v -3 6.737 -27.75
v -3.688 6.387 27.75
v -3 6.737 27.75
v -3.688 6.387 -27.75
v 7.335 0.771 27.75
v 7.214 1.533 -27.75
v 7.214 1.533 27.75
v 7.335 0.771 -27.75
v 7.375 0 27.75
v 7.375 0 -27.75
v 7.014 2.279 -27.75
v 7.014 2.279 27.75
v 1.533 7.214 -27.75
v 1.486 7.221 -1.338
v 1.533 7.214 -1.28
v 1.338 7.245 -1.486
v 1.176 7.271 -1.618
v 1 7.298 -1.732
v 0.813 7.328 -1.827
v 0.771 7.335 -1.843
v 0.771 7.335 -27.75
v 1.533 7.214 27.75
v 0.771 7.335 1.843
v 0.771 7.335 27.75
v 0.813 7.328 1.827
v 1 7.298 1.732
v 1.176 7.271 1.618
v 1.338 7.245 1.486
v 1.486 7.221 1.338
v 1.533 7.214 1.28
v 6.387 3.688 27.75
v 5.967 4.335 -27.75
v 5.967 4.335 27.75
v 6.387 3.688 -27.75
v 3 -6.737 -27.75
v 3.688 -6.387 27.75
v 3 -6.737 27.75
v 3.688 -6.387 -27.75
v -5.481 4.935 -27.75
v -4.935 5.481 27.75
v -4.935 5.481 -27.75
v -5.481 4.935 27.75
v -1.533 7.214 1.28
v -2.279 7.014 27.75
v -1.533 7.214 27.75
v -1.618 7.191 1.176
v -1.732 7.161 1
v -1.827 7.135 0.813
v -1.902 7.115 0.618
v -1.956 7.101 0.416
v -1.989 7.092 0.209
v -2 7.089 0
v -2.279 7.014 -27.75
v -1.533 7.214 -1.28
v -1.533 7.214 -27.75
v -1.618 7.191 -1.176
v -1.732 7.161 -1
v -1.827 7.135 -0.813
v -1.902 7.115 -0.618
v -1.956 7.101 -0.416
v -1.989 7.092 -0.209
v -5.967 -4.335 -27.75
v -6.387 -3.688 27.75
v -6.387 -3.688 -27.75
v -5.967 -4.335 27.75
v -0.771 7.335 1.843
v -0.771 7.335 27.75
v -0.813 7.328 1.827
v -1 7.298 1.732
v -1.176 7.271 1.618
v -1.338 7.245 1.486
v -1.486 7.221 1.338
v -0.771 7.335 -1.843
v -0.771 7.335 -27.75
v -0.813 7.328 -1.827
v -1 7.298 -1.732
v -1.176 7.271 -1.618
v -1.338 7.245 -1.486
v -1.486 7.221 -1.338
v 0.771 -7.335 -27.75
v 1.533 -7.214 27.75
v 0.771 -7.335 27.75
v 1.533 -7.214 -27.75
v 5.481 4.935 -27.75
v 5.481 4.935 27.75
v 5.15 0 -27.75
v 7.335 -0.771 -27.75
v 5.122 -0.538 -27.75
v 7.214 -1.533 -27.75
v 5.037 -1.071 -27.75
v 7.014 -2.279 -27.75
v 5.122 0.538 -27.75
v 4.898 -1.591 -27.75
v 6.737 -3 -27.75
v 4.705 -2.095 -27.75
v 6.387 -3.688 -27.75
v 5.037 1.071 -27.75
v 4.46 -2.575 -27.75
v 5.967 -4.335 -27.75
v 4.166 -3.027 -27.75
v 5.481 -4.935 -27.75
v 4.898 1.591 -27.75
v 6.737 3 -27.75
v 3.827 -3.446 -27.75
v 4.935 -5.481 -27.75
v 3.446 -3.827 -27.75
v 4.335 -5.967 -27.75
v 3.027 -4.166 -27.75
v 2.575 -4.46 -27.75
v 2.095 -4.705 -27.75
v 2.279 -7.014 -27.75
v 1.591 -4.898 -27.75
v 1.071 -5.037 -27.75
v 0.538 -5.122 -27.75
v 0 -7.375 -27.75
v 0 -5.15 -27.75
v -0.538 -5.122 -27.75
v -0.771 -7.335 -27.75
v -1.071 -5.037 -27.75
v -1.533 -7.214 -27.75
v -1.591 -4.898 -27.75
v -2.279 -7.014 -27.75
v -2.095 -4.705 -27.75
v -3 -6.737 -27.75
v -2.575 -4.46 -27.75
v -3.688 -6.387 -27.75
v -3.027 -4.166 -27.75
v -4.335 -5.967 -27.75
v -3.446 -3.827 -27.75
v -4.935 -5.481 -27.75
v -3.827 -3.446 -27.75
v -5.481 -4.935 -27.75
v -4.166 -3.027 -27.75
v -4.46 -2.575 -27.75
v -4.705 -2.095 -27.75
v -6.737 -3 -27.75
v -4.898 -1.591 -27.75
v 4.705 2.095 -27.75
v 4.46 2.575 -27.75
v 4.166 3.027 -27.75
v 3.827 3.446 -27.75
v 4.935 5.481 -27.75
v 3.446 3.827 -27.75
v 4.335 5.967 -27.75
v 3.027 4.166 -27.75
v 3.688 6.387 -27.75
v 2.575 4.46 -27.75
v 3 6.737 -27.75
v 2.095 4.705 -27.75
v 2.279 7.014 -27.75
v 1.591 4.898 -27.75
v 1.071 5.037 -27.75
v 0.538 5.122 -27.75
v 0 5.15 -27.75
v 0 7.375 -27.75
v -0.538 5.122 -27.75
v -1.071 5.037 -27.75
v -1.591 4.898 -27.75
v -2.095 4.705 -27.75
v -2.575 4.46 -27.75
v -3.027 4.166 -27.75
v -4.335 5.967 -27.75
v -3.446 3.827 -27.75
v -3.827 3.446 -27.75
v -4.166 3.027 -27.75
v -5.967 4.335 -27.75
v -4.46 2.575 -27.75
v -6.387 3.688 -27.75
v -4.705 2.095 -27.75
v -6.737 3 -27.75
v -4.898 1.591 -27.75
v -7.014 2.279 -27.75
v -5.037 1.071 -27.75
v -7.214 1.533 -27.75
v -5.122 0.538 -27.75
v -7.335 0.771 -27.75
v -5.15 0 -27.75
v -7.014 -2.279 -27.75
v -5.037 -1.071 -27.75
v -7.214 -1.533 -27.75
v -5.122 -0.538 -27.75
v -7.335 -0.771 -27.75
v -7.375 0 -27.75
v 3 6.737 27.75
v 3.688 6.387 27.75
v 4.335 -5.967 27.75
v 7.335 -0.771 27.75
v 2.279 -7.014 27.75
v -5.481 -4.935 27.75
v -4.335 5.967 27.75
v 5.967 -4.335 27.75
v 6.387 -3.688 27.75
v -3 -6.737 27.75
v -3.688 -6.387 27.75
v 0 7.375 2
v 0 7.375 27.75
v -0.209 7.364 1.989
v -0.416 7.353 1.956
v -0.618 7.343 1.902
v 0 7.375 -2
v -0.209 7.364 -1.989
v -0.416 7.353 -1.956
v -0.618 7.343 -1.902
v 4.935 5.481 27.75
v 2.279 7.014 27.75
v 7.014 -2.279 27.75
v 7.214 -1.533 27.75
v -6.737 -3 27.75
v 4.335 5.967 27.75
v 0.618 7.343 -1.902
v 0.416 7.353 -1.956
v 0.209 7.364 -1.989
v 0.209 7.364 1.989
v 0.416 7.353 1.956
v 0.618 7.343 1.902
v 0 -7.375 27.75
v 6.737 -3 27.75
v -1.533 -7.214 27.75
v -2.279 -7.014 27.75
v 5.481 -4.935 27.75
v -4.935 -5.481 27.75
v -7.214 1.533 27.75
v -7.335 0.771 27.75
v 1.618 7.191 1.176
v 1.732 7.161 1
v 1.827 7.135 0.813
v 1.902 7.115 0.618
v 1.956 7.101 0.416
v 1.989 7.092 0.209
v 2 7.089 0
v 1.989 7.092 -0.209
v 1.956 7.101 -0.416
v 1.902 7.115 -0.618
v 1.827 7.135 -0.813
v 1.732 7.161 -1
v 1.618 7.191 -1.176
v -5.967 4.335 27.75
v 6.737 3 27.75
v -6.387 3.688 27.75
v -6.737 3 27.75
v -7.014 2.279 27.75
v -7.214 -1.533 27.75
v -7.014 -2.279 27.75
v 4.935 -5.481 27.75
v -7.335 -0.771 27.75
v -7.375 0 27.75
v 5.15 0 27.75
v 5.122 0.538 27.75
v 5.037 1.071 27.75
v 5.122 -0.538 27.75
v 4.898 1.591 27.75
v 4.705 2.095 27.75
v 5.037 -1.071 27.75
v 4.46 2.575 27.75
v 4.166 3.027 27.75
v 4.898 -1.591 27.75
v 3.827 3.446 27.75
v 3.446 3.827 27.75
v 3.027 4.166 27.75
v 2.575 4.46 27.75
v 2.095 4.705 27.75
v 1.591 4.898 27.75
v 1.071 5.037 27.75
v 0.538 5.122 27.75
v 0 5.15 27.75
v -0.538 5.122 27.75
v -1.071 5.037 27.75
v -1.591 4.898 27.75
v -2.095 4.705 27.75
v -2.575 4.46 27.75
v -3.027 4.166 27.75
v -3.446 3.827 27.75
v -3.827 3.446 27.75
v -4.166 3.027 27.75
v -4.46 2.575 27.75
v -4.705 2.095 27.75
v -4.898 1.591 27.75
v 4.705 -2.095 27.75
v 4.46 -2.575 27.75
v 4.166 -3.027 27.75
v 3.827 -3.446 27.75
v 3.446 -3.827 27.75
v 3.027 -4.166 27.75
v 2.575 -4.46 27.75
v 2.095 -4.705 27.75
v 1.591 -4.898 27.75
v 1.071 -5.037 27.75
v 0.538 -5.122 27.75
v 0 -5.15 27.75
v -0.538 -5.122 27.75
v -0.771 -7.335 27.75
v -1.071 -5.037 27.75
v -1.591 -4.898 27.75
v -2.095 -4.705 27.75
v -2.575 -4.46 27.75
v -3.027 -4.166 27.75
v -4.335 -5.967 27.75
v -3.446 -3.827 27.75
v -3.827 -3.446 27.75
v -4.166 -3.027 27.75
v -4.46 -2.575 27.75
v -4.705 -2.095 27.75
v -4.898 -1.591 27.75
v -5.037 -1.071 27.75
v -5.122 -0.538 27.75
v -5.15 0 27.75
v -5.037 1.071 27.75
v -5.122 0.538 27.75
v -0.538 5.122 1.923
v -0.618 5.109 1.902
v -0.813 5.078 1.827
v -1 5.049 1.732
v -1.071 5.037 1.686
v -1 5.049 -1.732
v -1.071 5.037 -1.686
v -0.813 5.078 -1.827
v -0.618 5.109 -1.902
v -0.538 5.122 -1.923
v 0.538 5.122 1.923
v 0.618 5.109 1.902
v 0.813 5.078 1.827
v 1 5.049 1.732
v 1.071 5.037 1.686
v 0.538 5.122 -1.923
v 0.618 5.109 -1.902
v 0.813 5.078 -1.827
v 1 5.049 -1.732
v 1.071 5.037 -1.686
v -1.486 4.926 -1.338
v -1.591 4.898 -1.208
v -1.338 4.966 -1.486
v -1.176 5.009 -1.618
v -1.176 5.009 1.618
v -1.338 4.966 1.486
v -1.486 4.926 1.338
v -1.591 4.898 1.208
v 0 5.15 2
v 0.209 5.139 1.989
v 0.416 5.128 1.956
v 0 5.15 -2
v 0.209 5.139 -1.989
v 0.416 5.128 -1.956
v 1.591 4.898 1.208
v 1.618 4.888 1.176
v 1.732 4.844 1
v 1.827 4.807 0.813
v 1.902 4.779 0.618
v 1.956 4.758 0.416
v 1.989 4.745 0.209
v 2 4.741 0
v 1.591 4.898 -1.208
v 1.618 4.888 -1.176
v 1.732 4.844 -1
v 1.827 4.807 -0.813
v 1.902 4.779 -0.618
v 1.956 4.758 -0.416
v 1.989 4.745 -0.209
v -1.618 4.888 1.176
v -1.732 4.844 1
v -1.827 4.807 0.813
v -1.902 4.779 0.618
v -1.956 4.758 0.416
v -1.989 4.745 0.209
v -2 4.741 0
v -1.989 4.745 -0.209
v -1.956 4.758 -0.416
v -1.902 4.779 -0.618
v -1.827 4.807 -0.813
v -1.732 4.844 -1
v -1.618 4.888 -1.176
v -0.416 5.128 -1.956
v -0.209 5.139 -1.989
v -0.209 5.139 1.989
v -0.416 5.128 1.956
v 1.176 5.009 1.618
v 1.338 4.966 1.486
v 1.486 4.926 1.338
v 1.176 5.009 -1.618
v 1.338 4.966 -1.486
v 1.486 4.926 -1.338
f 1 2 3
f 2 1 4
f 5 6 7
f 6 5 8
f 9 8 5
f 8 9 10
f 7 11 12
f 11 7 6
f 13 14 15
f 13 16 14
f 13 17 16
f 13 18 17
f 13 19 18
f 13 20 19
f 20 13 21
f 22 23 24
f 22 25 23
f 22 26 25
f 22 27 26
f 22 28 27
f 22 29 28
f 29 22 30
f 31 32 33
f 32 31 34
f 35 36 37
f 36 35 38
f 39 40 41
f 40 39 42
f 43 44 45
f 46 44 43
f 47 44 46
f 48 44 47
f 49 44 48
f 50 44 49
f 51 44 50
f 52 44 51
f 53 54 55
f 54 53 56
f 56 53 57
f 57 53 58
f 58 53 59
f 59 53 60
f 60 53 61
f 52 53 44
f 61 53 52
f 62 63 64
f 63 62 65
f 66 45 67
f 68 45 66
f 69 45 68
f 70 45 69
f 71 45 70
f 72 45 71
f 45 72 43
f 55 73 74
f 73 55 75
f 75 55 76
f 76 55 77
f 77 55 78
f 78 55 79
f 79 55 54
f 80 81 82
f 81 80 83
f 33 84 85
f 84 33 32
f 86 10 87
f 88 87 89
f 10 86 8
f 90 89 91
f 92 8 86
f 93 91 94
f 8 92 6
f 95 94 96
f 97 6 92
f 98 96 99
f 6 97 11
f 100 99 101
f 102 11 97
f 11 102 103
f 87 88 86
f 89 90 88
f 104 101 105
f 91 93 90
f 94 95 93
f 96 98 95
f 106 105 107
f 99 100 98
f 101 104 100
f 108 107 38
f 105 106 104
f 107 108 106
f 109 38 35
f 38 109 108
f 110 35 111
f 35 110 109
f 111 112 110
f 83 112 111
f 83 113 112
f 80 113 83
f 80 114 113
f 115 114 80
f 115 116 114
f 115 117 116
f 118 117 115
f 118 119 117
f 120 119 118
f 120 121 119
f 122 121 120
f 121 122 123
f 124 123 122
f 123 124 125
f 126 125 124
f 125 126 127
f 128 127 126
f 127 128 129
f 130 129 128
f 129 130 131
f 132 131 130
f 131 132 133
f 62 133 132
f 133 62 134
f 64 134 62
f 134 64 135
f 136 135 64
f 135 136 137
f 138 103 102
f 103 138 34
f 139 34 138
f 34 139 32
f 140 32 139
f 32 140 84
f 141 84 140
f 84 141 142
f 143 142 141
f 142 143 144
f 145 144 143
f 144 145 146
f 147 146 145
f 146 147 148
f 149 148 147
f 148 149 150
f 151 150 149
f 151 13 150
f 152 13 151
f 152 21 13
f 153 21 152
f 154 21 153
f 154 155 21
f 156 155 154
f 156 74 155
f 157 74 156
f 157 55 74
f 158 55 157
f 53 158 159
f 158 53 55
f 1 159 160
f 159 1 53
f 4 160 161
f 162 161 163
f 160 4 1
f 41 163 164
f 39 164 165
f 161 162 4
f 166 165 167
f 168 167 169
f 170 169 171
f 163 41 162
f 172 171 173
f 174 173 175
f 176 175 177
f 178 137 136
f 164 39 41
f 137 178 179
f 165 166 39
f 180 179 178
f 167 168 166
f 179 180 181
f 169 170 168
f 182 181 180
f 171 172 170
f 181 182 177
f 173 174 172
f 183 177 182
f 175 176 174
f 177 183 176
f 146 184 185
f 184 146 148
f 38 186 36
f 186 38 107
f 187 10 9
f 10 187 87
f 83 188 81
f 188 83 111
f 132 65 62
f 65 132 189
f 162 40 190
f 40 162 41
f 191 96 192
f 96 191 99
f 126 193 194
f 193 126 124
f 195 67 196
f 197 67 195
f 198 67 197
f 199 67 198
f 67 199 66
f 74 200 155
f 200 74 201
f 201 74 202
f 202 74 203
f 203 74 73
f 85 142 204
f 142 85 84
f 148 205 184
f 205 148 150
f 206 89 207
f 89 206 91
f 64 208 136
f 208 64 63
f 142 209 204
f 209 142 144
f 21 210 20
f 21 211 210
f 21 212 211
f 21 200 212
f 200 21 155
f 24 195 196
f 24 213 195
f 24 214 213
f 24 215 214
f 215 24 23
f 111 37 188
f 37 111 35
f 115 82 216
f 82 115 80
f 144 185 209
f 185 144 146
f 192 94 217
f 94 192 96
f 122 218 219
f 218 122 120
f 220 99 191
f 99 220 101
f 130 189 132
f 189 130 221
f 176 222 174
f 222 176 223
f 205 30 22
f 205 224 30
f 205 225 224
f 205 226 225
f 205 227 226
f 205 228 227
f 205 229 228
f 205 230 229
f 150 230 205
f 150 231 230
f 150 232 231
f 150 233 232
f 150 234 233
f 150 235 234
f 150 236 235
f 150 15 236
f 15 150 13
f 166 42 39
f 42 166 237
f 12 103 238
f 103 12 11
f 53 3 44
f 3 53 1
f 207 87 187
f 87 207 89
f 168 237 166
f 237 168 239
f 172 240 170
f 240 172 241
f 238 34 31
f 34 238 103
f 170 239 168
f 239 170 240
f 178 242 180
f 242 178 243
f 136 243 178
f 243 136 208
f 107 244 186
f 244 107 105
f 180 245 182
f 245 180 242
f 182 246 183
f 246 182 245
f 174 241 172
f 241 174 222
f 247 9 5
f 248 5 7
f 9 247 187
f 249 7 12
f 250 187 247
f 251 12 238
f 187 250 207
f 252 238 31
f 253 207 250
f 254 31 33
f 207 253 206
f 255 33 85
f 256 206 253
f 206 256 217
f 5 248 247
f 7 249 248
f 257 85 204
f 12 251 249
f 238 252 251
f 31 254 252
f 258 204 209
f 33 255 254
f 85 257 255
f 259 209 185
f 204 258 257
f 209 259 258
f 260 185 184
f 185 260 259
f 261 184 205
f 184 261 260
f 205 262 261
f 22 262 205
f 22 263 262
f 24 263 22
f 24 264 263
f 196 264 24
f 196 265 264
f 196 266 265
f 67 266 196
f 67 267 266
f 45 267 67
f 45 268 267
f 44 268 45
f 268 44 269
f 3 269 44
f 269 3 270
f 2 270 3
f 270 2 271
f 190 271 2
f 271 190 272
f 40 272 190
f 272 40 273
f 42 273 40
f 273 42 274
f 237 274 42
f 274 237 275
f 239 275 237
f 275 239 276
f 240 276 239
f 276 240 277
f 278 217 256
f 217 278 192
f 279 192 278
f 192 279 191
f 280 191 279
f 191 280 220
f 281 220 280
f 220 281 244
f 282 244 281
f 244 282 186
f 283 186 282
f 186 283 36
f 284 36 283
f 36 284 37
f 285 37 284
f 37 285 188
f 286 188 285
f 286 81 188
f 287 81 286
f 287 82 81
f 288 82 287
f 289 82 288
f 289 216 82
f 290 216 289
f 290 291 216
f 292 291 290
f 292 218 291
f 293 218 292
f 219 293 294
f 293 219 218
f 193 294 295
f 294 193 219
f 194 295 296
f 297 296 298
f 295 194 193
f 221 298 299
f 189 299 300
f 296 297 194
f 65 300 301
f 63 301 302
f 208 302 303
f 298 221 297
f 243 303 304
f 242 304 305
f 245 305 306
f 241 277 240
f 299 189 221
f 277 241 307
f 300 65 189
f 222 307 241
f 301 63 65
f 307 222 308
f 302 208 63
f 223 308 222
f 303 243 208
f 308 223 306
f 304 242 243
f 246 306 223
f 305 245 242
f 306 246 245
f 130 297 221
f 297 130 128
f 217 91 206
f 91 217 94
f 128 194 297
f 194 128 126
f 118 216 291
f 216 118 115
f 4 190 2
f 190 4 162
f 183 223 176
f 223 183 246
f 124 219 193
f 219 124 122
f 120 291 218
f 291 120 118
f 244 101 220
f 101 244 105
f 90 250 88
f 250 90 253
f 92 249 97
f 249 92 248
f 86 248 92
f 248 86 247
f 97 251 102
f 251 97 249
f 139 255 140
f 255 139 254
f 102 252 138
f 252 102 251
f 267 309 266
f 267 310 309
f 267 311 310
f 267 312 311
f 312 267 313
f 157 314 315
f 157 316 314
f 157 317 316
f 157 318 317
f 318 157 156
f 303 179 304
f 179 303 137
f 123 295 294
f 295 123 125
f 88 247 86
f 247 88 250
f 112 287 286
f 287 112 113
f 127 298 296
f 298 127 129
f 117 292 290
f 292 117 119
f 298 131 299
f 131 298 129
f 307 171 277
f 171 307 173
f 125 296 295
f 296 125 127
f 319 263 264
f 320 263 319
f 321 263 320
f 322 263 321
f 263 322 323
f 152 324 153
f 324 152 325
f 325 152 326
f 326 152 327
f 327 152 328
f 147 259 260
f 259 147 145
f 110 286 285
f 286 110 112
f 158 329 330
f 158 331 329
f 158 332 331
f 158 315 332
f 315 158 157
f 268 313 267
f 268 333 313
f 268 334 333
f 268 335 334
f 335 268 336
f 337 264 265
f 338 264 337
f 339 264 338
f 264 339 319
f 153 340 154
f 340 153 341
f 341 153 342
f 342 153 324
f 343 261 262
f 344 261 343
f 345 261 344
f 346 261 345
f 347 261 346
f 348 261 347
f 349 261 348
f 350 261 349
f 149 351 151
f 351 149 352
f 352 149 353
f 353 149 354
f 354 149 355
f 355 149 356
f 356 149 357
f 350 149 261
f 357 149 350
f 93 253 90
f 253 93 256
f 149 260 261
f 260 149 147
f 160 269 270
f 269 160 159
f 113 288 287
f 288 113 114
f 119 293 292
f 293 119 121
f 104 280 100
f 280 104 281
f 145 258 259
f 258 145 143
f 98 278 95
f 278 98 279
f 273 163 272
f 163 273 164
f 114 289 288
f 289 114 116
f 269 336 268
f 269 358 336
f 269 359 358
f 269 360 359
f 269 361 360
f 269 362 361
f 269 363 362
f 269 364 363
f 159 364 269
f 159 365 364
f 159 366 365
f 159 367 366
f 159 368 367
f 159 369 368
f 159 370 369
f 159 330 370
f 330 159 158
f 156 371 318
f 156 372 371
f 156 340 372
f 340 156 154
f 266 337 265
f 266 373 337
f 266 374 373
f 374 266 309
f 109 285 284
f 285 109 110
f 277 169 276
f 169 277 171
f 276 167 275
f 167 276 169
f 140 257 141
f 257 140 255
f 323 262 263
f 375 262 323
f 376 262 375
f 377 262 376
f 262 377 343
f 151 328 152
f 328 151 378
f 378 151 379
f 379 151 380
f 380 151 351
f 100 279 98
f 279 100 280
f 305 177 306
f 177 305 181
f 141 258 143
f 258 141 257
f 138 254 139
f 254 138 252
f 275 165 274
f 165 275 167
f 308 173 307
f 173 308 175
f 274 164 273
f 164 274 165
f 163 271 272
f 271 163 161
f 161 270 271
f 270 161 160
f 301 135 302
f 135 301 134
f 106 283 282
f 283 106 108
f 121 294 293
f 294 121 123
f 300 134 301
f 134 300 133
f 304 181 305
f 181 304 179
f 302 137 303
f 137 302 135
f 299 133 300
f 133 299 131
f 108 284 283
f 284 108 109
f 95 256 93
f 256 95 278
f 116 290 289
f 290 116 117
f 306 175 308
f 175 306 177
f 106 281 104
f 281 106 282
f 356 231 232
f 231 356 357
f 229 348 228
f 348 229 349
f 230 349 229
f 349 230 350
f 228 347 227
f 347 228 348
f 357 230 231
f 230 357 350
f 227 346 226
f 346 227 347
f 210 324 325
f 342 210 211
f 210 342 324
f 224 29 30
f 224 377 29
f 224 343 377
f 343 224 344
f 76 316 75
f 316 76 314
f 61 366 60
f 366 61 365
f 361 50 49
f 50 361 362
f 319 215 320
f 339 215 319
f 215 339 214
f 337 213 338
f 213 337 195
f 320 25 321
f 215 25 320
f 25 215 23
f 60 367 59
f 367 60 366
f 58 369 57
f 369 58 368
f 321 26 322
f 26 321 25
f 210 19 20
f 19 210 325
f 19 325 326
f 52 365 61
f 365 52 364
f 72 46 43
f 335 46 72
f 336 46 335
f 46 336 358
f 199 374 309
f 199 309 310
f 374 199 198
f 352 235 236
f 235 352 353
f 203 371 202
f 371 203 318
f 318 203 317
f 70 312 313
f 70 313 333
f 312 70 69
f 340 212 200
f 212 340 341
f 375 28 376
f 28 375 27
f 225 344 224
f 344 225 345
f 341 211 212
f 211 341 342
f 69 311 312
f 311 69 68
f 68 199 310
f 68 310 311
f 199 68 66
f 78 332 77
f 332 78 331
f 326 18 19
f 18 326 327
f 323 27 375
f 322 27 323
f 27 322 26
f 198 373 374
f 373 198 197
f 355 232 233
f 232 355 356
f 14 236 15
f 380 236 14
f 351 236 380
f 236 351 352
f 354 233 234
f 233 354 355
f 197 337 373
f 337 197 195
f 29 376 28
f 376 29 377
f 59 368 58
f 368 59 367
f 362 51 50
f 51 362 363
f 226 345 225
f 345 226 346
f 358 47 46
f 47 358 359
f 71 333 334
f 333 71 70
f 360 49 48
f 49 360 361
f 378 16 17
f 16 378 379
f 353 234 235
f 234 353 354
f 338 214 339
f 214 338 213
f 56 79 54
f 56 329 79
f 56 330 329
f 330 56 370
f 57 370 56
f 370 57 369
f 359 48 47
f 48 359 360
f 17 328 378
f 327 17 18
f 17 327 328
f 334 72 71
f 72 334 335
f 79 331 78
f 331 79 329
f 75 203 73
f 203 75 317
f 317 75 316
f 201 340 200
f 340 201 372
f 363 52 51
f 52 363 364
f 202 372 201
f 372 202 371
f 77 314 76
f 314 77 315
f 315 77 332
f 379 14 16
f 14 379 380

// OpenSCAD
$fn = 60;

inner_tolerance = 0.3;
inner_diameter = 10 + inner_tolerance; // Pen - Width also changes as you go up from 9.7 to 10.
outer_diameter = 14.75; // Marker - Width changes depending on where you measure. Bottom = 14.6, Top = 14.8
screw_diameter = 4;     // Screw

diameter_diff = outer_diameter - inner_diameter;
height = 50.5 + 5; // holder top to bottom is 50.5

difference()
{
    cylinder(h = height, r = outer_diameter / 2, center = true);
    cylinder(h = height, r = inner_diameter / 2, center = true);
    translate([ 0, (inner_diameter + (diameter_diff / 2)) / 2, 0 ]) rotate(a = 90, v = [ 1, 0, 0 ])
        cylinder(h = diameter_diff, r = screw_diameter / 2, center = true);
}
